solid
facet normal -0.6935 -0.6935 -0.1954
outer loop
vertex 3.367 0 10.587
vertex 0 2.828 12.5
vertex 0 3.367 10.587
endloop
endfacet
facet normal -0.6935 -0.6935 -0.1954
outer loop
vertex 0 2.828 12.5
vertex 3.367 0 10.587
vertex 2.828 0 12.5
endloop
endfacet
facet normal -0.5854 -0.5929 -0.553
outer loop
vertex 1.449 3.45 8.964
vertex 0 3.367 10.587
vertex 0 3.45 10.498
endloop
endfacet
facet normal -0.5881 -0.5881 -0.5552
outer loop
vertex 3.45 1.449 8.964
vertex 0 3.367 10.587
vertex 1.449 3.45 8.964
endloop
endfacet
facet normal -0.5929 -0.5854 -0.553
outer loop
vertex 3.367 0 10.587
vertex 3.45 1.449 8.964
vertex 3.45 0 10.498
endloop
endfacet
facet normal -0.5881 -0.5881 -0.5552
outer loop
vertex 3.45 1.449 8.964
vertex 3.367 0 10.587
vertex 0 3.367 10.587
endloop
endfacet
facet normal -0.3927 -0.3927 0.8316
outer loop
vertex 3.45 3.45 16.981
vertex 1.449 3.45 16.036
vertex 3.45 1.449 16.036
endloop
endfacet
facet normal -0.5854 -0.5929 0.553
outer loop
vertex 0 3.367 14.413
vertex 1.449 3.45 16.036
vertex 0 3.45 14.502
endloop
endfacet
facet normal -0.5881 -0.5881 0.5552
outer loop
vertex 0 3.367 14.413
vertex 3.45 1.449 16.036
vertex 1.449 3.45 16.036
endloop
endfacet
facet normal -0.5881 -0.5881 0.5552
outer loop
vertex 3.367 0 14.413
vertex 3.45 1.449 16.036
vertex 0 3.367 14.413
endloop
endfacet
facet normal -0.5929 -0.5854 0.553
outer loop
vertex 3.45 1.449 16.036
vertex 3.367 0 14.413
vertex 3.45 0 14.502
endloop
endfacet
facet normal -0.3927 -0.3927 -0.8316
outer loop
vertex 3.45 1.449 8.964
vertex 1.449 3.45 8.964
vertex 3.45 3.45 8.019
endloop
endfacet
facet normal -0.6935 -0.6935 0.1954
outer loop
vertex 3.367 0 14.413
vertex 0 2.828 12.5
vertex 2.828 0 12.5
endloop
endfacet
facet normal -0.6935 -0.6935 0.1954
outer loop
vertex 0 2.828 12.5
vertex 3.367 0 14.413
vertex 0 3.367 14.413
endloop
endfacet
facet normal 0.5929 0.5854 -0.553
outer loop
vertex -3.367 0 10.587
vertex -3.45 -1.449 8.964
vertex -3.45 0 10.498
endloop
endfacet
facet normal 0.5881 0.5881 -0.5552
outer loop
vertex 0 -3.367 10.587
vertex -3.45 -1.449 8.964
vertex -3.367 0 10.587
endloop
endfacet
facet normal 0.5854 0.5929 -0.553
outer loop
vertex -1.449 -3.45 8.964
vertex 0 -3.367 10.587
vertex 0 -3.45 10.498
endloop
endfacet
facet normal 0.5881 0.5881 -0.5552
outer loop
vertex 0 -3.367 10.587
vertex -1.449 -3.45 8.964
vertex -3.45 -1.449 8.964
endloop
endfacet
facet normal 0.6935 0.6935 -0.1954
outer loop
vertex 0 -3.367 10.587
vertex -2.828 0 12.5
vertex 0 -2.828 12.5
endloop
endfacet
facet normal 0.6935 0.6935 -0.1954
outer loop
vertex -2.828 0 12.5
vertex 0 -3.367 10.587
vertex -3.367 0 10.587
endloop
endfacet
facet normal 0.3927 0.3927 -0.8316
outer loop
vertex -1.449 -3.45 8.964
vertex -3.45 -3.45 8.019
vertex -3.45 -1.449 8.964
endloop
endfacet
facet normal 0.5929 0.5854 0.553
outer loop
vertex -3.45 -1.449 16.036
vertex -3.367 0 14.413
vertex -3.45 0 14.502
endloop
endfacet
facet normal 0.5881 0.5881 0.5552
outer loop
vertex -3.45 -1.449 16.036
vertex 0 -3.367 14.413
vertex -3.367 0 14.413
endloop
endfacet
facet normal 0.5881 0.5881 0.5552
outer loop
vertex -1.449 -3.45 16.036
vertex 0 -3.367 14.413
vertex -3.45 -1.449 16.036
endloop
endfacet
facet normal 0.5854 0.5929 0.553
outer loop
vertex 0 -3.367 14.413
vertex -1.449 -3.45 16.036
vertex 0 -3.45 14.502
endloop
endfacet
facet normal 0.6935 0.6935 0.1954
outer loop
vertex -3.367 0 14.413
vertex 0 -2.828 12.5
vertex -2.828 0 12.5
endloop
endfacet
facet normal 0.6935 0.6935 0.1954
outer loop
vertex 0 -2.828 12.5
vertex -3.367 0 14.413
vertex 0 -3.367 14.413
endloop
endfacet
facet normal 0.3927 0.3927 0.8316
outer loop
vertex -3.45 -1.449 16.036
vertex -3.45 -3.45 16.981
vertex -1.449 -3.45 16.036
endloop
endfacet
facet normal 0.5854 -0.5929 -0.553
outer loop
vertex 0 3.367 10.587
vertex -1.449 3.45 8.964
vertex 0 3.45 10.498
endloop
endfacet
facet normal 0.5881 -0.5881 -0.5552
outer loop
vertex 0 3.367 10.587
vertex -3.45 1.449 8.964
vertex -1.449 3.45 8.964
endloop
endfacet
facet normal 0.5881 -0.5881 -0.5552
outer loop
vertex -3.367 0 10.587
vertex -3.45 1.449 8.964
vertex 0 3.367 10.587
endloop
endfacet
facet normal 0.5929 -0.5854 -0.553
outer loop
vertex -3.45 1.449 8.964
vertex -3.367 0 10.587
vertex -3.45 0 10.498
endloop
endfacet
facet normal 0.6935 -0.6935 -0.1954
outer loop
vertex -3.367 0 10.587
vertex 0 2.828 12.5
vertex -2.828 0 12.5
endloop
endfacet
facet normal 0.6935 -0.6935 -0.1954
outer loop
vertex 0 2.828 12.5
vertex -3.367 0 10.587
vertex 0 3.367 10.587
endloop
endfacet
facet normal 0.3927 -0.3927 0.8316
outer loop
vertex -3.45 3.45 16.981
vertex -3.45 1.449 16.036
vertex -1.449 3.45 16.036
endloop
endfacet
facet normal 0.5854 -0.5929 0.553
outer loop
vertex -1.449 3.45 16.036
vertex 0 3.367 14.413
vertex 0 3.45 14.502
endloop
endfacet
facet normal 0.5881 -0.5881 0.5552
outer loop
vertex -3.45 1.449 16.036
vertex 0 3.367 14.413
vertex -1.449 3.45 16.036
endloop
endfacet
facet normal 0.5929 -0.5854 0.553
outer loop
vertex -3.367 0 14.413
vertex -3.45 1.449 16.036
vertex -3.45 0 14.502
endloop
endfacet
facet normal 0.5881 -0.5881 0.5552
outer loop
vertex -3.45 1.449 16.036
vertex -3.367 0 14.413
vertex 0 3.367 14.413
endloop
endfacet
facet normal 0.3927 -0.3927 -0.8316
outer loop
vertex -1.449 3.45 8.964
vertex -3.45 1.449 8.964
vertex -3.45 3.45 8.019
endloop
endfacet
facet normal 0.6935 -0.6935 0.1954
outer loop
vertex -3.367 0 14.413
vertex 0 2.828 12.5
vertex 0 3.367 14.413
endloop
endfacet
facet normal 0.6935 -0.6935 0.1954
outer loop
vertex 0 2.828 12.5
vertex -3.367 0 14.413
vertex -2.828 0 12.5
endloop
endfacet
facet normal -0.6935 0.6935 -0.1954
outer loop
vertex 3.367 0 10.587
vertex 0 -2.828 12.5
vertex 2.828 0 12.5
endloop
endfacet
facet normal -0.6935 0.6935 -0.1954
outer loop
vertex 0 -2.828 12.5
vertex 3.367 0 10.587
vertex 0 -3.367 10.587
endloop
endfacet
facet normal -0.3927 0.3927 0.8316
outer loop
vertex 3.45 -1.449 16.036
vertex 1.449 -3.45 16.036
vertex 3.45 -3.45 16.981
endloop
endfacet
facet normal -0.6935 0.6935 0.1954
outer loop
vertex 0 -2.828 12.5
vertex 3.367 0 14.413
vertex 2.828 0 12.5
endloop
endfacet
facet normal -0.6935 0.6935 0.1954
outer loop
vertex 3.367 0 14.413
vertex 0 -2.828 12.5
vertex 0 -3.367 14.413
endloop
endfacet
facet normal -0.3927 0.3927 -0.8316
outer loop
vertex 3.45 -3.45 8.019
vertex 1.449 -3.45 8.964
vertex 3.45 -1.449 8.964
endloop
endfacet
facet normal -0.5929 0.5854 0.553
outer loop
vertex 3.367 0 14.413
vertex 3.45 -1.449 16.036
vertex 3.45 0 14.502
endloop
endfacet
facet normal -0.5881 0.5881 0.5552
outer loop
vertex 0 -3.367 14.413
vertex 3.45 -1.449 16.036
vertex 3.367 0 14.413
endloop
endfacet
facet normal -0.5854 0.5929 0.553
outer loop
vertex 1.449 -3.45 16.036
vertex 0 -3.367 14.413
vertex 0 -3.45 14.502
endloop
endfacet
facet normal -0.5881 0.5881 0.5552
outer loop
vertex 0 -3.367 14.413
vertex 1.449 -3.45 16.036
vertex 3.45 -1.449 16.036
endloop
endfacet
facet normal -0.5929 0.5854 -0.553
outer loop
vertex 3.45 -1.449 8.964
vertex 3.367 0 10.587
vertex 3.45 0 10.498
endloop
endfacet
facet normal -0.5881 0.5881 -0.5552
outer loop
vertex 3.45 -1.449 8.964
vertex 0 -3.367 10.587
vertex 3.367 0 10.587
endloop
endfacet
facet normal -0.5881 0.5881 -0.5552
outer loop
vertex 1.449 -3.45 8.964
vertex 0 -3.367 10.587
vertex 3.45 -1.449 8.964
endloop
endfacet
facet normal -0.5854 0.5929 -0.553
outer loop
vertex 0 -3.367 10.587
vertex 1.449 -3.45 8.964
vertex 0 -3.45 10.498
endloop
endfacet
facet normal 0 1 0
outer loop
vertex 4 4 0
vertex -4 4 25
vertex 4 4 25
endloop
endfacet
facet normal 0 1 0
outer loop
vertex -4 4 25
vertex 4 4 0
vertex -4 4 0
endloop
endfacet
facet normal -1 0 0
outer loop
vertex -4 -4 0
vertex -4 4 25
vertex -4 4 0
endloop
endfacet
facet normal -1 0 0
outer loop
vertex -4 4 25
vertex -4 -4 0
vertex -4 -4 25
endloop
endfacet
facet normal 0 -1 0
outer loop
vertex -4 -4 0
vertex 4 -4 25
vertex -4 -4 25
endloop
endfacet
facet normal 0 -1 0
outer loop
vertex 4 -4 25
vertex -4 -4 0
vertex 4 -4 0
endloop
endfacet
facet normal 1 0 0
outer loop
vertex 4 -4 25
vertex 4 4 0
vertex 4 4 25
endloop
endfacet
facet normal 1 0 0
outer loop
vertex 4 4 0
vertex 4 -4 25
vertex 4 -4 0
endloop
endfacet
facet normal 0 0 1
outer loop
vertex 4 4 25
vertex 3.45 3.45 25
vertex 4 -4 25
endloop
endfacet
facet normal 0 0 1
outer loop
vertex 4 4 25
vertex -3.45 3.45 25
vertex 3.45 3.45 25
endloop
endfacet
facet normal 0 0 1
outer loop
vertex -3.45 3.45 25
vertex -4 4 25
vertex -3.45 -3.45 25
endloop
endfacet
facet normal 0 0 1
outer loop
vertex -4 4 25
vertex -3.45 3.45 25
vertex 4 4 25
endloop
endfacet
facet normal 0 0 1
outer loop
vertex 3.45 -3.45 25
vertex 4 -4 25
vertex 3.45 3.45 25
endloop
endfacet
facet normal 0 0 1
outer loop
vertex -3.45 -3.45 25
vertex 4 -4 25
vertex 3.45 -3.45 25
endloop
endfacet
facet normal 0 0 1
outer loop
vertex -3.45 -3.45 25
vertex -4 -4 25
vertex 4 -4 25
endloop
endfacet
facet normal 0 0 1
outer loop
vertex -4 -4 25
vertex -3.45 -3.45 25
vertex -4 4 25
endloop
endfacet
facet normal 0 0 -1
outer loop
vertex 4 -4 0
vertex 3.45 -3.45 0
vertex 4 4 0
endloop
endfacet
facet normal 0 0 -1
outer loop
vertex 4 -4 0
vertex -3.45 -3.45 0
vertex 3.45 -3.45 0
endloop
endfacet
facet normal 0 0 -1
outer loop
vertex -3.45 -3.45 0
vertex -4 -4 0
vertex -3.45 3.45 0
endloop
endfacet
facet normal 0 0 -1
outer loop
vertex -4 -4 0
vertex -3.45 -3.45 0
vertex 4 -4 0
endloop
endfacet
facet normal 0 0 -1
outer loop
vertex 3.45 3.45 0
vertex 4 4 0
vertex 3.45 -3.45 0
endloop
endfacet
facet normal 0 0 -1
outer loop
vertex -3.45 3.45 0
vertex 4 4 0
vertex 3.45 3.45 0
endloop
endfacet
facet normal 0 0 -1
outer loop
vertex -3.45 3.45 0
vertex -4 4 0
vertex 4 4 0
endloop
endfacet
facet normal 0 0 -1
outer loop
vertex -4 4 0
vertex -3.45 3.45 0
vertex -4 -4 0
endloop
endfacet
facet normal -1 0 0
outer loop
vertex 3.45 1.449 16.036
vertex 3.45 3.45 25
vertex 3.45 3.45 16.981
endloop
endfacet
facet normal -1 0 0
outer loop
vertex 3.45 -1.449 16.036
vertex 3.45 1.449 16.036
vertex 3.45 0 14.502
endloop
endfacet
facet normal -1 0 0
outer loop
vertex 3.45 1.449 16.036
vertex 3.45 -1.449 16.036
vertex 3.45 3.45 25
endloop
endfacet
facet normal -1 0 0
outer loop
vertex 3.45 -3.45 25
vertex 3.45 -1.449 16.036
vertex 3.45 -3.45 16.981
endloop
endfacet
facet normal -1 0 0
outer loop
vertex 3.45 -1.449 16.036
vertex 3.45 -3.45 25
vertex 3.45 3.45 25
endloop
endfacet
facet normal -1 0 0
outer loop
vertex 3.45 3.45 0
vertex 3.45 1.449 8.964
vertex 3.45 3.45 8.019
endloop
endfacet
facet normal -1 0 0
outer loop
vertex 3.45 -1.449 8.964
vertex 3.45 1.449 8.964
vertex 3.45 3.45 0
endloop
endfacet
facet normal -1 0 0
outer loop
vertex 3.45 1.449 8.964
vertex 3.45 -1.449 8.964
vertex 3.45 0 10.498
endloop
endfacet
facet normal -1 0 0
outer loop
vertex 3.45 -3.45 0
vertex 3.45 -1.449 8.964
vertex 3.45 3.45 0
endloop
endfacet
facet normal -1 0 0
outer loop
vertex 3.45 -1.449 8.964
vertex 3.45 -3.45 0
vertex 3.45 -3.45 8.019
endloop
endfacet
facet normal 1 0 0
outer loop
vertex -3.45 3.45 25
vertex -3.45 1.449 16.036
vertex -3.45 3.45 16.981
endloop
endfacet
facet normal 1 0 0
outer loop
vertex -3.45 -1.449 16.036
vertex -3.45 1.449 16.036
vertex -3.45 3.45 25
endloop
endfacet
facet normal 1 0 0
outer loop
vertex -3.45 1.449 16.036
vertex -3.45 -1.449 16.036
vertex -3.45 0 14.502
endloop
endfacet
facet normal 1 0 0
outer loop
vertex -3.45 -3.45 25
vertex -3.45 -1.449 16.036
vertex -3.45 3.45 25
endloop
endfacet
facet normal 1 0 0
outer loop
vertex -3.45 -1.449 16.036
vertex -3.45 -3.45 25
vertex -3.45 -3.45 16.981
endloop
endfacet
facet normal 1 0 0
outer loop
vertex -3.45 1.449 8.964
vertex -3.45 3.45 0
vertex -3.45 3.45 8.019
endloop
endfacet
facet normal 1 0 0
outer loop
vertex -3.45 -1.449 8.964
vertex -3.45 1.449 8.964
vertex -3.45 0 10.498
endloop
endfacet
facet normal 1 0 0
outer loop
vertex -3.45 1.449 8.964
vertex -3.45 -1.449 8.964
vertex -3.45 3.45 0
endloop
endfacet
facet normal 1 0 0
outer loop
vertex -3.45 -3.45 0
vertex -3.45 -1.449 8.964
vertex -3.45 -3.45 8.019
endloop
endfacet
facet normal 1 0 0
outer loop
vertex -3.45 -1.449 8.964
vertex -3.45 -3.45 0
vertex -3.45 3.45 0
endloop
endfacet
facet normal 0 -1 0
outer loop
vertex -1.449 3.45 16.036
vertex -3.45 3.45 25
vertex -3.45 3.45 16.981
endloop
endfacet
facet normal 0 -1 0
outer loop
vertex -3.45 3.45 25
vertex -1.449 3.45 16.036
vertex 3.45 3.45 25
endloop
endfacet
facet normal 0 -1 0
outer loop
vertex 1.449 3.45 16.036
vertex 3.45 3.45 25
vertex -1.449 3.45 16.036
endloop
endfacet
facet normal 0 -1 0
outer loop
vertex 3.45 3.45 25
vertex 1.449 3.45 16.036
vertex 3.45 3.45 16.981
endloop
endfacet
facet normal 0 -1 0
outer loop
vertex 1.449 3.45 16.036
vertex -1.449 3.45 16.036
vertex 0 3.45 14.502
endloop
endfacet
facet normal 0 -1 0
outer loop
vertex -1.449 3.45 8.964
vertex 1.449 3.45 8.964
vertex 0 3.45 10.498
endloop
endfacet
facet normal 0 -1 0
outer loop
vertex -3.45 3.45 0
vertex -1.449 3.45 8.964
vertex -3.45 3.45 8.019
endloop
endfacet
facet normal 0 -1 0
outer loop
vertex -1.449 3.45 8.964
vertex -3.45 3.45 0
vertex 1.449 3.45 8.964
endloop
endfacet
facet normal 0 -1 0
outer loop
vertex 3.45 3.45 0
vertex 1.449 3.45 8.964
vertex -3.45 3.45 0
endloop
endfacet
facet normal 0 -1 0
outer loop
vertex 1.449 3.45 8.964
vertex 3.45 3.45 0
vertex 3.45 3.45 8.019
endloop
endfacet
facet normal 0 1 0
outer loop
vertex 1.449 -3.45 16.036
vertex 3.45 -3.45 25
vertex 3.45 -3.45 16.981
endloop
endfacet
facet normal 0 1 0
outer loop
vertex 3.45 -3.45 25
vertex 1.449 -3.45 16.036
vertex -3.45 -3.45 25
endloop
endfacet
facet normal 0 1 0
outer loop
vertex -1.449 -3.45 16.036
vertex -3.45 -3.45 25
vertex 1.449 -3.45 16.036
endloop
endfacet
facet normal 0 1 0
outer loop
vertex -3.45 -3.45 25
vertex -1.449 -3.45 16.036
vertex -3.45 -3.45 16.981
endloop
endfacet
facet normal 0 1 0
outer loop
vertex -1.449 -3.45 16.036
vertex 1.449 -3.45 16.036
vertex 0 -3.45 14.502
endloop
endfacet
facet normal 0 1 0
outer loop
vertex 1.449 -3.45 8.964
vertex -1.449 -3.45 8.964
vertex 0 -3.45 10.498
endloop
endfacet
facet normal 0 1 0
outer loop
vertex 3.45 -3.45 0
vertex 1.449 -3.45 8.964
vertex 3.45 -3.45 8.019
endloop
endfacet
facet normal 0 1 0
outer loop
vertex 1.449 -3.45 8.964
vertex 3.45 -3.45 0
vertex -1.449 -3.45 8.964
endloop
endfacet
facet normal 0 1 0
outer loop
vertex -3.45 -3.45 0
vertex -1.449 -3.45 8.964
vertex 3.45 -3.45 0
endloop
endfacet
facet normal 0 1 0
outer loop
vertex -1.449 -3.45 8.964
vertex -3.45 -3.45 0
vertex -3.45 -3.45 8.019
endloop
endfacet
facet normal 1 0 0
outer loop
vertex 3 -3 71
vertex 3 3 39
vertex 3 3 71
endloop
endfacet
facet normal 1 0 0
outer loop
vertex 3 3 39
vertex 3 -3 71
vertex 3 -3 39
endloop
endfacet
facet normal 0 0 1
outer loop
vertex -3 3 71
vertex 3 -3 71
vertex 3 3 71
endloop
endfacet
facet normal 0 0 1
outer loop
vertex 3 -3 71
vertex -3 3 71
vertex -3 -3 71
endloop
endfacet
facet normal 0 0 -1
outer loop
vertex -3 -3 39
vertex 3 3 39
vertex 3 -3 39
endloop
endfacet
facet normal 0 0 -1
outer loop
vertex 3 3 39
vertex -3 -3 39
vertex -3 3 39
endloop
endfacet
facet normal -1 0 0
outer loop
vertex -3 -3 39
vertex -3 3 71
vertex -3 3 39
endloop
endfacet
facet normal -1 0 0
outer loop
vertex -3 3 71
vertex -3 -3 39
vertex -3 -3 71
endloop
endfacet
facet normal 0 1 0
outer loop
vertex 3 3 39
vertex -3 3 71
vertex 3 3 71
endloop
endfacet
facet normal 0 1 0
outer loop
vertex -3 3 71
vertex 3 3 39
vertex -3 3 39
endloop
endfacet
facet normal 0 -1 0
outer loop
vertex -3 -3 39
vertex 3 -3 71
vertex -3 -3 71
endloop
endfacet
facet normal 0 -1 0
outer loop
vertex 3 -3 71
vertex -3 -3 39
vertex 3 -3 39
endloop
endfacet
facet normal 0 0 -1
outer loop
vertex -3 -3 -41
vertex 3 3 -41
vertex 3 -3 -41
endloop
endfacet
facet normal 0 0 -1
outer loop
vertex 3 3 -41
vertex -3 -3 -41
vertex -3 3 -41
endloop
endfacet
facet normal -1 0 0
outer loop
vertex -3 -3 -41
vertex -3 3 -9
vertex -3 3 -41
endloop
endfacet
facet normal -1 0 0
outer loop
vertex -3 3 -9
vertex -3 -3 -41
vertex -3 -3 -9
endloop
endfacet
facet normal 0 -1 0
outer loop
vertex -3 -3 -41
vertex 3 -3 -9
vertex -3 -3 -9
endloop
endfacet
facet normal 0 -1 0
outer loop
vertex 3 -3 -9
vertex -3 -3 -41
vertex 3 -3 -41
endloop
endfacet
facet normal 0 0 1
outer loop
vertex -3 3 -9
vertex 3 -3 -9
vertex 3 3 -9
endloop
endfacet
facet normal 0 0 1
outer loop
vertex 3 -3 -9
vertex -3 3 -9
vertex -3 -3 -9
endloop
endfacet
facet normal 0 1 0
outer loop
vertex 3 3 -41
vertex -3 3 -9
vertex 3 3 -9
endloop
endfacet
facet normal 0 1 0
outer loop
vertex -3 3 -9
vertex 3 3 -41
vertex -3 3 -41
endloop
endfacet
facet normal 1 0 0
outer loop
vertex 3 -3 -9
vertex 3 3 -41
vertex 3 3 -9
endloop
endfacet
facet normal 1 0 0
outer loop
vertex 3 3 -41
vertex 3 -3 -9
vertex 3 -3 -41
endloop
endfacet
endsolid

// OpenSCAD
// file: 3dprinter.scad
//BioDeploy SCAD file = 3dprinter.scad


//choose the max specs for your 3d printer
//here we use a replicator2x specs

x_print_max = 25*10;
y_print_max = 15.2*10;
z_print_max = 15.5*10;

//don't forget *10 to put in centimeters
// file: generator_variables.scad
//===============================================//
//===============================================//
// BioDeploy SCAD file = generator_variables.scad//
//                 Start File                    //
//===============================================//
//===============================================//
//-----------------------------------------------//
include <3dprinter.scad>
//===============================================//
//                   variables                   //
//===============================================//
//===============================================//
pad = 0.1; //padding
//choose the spec for your generator
//===============================================//
//                    magnets1                   //
//===============================================//
//Volume :
x_magnet = 5.5;
y_magnet = 21.5;
z_magnet = 21.5;
//Number of magnets on the rotor :
nbmagnetsonrotor = 16;
rotor_ext_max = 60;
//===============================================//
//                    magnets2                   //
//===============================================//
//Volume :
diam_magnet2 = 35;
z_magnet2 = 5;
//Number of magnets on the rotor :
nbmagnetsonrotor2 = 6;
//===============================================//
//                      rotor                    //
//===============================================//
smooth_rotor = 100;
smooth_bobine = 100;
z_rotor_int = 20;
//===============================================//
//                  adapter_rotor                //
//===============================================//
diam_adapter_max = 32 ;
diam_adapter_min = 25.15 ;
h_adapter = 7;
h_adapter_box = 12;
nbarm = 6;
//===============================================//
//                    Bobine1                    //
//===============================================//
r_bobine_ext_max = y_magnet/2;
r_bobine_ext_min = 4.5;
r_bobine_int = 3.5;

x_bobine = 30;
p_bobine_ext = 1;

r_bobine2_ext_min = 3.4;
r_bobine2_int = 2.5;

wire_in = 1;
wire_out = 1;


//===============================================//
//                    Protector                  //
//===============================================//

r_bobine_protector_ext_max = y_magnet/2 + 1.5;
gap_bobine_protector = (r_bobine_protector_ext_max - r_bobine_ext_max)/2;


x_bobine_protector=x_bobine+1.5;

smooth_protector = 100;

//===============================================//
//                    Socle1                     //
//===============================================//

r_socle_int = 0;
r_socle_ext = 0;
position_bobine_in = 0;
position_bobine_out = 0;
connector_socle_female =0;
connector_socle_male =0;
space_marge=3;

//-----------------------------------------------//
//===============================================//
//===============================================//
// BioDeploy SCAD file = generator_variables.scad//
//                   End  File                   //
//===============================================//
//===============================================//
// main file
//===============================================//
//===============================================//
//BioDeploy SCAD file = generator_rotor_adapter_stagelinker.scad//
//                 Start File                    //
//===============================================//
//===============================================//
//-----------------------------------------------//

//===============================================//
//                   variables                   //
//===============================================//
include <generator_variables.scad>
//===============================================//
//               Calls for use                   //
//===============================================//
//use <generator_logo.scad>
//===============================================//
//                    Trees                      //
//===============================================//

module armlinker() {
translate([0,0,25/2])cube([8,8,25], center=true);
}




module armlinkerint() {
translate([0,0,32/2-pad])cube([6.9,6.9,32], center=true);
}




module stagemarker(){
translate([7,0,25/2])rotate([90,0,0])cylinder(8,5,5, center=true);}


module blanklinker(){
translate([-50,4,0])cube([100,10,35]);}

module prelinker1(){
difference(){
union(){
rotate([0,0,45])stagemarker();
rotate([0,0,225])stagemarker();
rotate([0,0,135])stagemarker();
rotate([0,0,315])stagemarker();}
union(){
rotate([0,0,0])blanklinker();
rotate([0,0,90])blanklinker();
rotate([0,0,180])blanklinker();
rotate([0,0,270])blanklinker();}}}


module prelinker2(){
difference() {
armlinker();
armlinkerint();
}}





module linker(){
prelinker1();
prelinker2();
}

linker();

module barrelinker() {
translate([0,0,55])cube([6,6,32], center=true);
rotate([180,0,0])translate([0,0,25])cube([6,6,32], center=true);}

barrelinker();



//-----------------------------------------------//
//===============================================//
//===============================================//
//BioDeploy SCAD file = generator_rotor_adapter_stagelinker.scad//
//                   End  File                   //
//===============================================//
//===============================================//
